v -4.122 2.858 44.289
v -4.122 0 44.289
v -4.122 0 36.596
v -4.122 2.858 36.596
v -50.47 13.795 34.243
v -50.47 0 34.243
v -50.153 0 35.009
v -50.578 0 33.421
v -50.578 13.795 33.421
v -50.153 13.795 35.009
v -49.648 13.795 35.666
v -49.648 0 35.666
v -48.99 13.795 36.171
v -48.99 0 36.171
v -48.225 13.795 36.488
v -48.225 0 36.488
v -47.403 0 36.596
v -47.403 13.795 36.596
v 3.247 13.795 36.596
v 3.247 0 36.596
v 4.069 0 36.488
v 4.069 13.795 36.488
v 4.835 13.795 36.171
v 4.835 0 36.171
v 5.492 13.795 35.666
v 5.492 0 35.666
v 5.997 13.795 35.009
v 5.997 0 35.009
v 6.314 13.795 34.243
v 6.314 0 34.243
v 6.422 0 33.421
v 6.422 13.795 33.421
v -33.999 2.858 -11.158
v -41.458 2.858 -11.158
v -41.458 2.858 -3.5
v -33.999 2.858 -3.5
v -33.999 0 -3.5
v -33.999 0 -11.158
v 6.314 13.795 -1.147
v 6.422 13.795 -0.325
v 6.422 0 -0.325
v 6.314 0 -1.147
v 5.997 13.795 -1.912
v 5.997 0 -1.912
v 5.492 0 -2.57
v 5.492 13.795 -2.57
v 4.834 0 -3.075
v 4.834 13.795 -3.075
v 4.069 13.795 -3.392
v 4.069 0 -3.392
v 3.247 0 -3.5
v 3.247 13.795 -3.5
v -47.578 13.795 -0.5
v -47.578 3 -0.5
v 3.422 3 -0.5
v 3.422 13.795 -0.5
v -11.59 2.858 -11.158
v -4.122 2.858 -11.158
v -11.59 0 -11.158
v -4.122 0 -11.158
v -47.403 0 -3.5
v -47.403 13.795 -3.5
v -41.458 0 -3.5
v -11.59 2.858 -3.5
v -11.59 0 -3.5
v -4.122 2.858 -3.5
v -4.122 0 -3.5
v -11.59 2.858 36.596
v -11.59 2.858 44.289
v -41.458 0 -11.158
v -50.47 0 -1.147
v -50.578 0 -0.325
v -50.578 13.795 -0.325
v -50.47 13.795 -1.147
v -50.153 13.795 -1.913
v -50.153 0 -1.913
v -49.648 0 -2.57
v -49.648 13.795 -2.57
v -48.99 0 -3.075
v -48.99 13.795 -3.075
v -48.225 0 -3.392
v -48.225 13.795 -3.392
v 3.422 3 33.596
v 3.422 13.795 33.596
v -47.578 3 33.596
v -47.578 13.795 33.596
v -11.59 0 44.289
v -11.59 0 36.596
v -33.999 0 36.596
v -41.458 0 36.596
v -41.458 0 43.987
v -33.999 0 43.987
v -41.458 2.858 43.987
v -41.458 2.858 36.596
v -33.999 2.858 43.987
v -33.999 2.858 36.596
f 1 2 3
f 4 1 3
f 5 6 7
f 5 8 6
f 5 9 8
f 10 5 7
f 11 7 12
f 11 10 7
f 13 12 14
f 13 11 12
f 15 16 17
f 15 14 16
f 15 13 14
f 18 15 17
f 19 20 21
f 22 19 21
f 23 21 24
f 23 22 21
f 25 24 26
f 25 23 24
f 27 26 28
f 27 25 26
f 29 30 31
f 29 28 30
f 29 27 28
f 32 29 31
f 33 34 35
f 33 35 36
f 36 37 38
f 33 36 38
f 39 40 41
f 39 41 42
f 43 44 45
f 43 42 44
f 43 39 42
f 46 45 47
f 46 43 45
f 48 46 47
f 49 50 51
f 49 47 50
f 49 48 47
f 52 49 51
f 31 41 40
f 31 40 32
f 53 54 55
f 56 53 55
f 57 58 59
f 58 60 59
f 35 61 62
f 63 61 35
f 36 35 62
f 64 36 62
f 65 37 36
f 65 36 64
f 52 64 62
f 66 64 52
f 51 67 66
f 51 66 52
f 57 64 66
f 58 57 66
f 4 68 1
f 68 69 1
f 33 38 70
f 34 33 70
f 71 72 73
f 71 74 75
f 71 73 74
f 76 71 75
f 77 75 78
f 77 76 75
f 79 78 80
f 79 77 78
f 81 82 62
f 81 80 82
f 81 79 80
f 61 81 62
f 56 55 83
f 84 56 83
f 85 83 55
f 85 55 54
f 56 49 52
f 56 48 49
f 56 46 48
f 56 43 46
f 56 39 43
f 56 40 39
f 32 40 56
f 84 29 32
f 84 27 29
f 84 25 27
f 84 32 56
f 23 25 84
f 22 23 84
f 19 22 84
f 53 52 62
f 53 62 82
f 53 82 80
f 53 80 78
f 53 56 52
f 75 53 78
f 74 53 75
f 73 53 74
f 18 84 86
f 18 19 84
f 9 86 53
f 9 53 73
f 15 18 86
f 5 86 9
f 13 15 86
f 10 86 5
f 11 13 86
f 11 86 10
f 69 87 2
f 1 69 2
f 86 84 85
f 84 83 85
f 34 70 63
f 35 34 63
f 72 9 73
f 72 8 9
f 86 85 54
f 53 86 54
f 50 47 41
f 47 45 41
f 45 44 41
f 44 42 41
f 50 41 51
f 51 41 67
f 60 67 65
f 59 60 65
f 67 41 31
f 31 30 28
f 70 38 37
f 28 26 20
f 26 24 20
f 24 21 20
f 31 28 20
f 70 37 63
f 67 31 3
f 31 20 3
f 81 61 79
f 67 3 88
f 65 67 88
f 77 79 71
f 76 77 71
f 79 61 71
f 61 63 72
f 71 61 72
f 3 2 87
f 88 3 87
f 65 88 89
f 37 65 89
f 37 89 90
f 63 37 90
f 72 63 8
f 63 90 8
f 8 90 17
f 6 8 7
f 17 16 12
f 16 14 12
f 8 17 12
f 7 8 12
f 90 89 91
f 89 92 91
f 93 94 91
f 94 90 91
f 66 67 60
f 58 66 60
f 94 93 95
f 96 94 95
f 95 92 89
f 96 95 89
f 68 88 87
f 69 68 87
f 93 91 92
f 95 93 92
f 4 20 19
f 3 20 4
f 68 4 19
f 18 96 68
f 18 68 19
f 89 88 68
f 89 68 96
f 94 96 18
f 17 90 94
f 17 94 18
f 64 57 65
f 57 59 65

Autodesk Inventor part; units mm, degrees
ref_plane "YZ Plane" through (0, 0, 0) normal (1, 0, 0) x (0, 1, 0)
ref_plane "XZ Plane" through (0, 0, 0) normal (0, 1, 0) x (-1, 0, 0)
sketch "Sketch1" plane through (0, 0, 0) normal (0, 1, 0) x (-1, 0, 0)
  line L0 (-2.922, 0) -> (47.078, 0)
  line L1 (47.078, 0) -> (47.078, 33.0962)
  line L2 (47.078, 33.0962) -> (-2.922, 33.0962)
  line L3 (-2.922, 33.0962) -> (-2.922, 0)
  line L4 (50.578, 36.5962) -> (50.578, -3.5)
  line L5 (50.578, -3.5) -> (-6.422, -3.5)
  line L6 (-6.422, -3.5) -> (-6.422, 36.5962)
  line L7 (-6.422, 36.5962) -> (50.578, 36.5962)
  point P0 (0, 0)
  dimension "d0" = 50
  dimension "d1" = 33.0962
  dimension "d2" = 3.5
extrude "Extrusion1" add sketch "Sketch1" along normal blind 13.97 contours L3 L2 L1 L0 | L4 L5 L6 L7
shell "Shell1" thickness 3 removed faces 0
sketch "Sketch2" plane through (0, 13.97, 0) normal (0, 1, 0) x (1, 0, 0)
  point P0 (0, 0)
move faces "Move1" translate (0, -3.175, 0) faces at (-12.578, 13.97, 23.2308)
move faces "Move2" translate (0, 3, 0) faces at (-13.578, 10.795, 35.5962)
fillet "Fillet1" radius 3.175 4 edges at (6.422, 6.8975, 36.5962) (6.422, 6.8975, -3.5) (-50.578, 6.8975, -3.5) (-50.578, 6.8975, 36.5962)
ref_plane "Work Plane1" through (-47.403, 13.795, 36.5962) normal (0, 1, 0) x (1, 0, 0)
sketch "Sketch3" plane through (-47.403, 13.795, 36.5962) normal (0, 1, 0) x (1, 0, 0)
  arc A0 (-3.175, 3.175) -> (0, 0) centre (0, 3.175) ccw projected
  line L0 (0, 0) -> (50.65, 0) projected
  arc A1 (50.65, 0) -> (53.825, 3.175) centre (50.65, 3.175) ccw projected
  line L1 (53.825, 3.175) -> (53.825, 36.9212) projected
  arc A2 (53.825, 36.9212) -> (50.65, 40.0962) centre (50.65, 36.9212) ccw projected
  line L2 (50.65, 40.0962) -> (0, 40.0962) projected
  arc A3 (0, 40.0962) -> (-3.175, 36.9212) centre (0, 36.9212) ccw projected
  line L3 (-3.175, 36.9212) -> (-3.175, 3.175) projected
  line L4 (50.825, 3) -> (-0.175, 3) projected
  line L5 (-0.175, 3) -> (-0.175, 37.0962) projected
  line L6 (-0.175, 37.0962) -> (50.825, 37.0962) projected
  line L7 (50.825, 37.0962) -> (50.825, 3) projected
  point P0 (47.403, 36.5962)
sketch "Sketch4" plane through (0, 0, 0) normal (0, -1, 0) x (1, 0, 0)
  arc A0 (-50.578, 33.4212) -> (-47.403, 36.5962) centre (-47.403, 33.4212) ccw projected
  line L0 (-50.578, -0.325) -> (-50.578, 33.4212) projected
  arc A1 (-47.403, -3.5) -> (-50.578, -0.325) centre (-47.403, -0.325) ccw projected
  line L1 (3.247, -3.5) -> (-47.403, -3.5)
  arc A2 (6.422, -0.325) -> (3.247, -3.5) centre (3.247, -0.325) ccw projected
  line L2 (6.422, 33.4212) -> (6.422, -0.325) projected
  arc A3 (3.247, 36.5962) -> (6.422, 33.4212) centre (3.247, 33.4212) ccw projected
  line L3 (-47.403, 36.5962) -> (3.247, 36.5962)
  line L4 (-41.4583, 43.9872) -> (-33.9992, 43.9872)
  line L5 (-33.9992, 43.9872) -> (-33.9992, -11.1575)
  line L6 (-33.9992, -11.1575) -> (-41.4583, -11.1575)
  line L7 (-41.4583, -11.1575) -> (-41.4583, 43.9872)
  line L8 (-11.5895, 44.289) -> (-4.1219, 44.289)
  line L9 (-4.1219, 44.289) -> (-4.1219, -11.1575)
  line L10 (-4.1219, -11.1575) -> (-11.5895, -11.1575)
  line L11 (-11.5895, -11.1575) -> (-11.5895, 44.289)
  point P0 (0, 0)
  dimension "d15" = 7.4591
  dimension "d16" = 55.1447
  dimension "d17" = 7.4676
extrude "Extrusion2" add sketch "Sketch4" against normal blind 2.8575 contours L7 L4 L5 L3 | L3 L5 L1 L7 | L1 L5 L6 L7 | L11 L8 L9 L3 | L3 L9 L1 L11 | L1 L9 L10 L11
properties part number "Gyro_box_bottom"
